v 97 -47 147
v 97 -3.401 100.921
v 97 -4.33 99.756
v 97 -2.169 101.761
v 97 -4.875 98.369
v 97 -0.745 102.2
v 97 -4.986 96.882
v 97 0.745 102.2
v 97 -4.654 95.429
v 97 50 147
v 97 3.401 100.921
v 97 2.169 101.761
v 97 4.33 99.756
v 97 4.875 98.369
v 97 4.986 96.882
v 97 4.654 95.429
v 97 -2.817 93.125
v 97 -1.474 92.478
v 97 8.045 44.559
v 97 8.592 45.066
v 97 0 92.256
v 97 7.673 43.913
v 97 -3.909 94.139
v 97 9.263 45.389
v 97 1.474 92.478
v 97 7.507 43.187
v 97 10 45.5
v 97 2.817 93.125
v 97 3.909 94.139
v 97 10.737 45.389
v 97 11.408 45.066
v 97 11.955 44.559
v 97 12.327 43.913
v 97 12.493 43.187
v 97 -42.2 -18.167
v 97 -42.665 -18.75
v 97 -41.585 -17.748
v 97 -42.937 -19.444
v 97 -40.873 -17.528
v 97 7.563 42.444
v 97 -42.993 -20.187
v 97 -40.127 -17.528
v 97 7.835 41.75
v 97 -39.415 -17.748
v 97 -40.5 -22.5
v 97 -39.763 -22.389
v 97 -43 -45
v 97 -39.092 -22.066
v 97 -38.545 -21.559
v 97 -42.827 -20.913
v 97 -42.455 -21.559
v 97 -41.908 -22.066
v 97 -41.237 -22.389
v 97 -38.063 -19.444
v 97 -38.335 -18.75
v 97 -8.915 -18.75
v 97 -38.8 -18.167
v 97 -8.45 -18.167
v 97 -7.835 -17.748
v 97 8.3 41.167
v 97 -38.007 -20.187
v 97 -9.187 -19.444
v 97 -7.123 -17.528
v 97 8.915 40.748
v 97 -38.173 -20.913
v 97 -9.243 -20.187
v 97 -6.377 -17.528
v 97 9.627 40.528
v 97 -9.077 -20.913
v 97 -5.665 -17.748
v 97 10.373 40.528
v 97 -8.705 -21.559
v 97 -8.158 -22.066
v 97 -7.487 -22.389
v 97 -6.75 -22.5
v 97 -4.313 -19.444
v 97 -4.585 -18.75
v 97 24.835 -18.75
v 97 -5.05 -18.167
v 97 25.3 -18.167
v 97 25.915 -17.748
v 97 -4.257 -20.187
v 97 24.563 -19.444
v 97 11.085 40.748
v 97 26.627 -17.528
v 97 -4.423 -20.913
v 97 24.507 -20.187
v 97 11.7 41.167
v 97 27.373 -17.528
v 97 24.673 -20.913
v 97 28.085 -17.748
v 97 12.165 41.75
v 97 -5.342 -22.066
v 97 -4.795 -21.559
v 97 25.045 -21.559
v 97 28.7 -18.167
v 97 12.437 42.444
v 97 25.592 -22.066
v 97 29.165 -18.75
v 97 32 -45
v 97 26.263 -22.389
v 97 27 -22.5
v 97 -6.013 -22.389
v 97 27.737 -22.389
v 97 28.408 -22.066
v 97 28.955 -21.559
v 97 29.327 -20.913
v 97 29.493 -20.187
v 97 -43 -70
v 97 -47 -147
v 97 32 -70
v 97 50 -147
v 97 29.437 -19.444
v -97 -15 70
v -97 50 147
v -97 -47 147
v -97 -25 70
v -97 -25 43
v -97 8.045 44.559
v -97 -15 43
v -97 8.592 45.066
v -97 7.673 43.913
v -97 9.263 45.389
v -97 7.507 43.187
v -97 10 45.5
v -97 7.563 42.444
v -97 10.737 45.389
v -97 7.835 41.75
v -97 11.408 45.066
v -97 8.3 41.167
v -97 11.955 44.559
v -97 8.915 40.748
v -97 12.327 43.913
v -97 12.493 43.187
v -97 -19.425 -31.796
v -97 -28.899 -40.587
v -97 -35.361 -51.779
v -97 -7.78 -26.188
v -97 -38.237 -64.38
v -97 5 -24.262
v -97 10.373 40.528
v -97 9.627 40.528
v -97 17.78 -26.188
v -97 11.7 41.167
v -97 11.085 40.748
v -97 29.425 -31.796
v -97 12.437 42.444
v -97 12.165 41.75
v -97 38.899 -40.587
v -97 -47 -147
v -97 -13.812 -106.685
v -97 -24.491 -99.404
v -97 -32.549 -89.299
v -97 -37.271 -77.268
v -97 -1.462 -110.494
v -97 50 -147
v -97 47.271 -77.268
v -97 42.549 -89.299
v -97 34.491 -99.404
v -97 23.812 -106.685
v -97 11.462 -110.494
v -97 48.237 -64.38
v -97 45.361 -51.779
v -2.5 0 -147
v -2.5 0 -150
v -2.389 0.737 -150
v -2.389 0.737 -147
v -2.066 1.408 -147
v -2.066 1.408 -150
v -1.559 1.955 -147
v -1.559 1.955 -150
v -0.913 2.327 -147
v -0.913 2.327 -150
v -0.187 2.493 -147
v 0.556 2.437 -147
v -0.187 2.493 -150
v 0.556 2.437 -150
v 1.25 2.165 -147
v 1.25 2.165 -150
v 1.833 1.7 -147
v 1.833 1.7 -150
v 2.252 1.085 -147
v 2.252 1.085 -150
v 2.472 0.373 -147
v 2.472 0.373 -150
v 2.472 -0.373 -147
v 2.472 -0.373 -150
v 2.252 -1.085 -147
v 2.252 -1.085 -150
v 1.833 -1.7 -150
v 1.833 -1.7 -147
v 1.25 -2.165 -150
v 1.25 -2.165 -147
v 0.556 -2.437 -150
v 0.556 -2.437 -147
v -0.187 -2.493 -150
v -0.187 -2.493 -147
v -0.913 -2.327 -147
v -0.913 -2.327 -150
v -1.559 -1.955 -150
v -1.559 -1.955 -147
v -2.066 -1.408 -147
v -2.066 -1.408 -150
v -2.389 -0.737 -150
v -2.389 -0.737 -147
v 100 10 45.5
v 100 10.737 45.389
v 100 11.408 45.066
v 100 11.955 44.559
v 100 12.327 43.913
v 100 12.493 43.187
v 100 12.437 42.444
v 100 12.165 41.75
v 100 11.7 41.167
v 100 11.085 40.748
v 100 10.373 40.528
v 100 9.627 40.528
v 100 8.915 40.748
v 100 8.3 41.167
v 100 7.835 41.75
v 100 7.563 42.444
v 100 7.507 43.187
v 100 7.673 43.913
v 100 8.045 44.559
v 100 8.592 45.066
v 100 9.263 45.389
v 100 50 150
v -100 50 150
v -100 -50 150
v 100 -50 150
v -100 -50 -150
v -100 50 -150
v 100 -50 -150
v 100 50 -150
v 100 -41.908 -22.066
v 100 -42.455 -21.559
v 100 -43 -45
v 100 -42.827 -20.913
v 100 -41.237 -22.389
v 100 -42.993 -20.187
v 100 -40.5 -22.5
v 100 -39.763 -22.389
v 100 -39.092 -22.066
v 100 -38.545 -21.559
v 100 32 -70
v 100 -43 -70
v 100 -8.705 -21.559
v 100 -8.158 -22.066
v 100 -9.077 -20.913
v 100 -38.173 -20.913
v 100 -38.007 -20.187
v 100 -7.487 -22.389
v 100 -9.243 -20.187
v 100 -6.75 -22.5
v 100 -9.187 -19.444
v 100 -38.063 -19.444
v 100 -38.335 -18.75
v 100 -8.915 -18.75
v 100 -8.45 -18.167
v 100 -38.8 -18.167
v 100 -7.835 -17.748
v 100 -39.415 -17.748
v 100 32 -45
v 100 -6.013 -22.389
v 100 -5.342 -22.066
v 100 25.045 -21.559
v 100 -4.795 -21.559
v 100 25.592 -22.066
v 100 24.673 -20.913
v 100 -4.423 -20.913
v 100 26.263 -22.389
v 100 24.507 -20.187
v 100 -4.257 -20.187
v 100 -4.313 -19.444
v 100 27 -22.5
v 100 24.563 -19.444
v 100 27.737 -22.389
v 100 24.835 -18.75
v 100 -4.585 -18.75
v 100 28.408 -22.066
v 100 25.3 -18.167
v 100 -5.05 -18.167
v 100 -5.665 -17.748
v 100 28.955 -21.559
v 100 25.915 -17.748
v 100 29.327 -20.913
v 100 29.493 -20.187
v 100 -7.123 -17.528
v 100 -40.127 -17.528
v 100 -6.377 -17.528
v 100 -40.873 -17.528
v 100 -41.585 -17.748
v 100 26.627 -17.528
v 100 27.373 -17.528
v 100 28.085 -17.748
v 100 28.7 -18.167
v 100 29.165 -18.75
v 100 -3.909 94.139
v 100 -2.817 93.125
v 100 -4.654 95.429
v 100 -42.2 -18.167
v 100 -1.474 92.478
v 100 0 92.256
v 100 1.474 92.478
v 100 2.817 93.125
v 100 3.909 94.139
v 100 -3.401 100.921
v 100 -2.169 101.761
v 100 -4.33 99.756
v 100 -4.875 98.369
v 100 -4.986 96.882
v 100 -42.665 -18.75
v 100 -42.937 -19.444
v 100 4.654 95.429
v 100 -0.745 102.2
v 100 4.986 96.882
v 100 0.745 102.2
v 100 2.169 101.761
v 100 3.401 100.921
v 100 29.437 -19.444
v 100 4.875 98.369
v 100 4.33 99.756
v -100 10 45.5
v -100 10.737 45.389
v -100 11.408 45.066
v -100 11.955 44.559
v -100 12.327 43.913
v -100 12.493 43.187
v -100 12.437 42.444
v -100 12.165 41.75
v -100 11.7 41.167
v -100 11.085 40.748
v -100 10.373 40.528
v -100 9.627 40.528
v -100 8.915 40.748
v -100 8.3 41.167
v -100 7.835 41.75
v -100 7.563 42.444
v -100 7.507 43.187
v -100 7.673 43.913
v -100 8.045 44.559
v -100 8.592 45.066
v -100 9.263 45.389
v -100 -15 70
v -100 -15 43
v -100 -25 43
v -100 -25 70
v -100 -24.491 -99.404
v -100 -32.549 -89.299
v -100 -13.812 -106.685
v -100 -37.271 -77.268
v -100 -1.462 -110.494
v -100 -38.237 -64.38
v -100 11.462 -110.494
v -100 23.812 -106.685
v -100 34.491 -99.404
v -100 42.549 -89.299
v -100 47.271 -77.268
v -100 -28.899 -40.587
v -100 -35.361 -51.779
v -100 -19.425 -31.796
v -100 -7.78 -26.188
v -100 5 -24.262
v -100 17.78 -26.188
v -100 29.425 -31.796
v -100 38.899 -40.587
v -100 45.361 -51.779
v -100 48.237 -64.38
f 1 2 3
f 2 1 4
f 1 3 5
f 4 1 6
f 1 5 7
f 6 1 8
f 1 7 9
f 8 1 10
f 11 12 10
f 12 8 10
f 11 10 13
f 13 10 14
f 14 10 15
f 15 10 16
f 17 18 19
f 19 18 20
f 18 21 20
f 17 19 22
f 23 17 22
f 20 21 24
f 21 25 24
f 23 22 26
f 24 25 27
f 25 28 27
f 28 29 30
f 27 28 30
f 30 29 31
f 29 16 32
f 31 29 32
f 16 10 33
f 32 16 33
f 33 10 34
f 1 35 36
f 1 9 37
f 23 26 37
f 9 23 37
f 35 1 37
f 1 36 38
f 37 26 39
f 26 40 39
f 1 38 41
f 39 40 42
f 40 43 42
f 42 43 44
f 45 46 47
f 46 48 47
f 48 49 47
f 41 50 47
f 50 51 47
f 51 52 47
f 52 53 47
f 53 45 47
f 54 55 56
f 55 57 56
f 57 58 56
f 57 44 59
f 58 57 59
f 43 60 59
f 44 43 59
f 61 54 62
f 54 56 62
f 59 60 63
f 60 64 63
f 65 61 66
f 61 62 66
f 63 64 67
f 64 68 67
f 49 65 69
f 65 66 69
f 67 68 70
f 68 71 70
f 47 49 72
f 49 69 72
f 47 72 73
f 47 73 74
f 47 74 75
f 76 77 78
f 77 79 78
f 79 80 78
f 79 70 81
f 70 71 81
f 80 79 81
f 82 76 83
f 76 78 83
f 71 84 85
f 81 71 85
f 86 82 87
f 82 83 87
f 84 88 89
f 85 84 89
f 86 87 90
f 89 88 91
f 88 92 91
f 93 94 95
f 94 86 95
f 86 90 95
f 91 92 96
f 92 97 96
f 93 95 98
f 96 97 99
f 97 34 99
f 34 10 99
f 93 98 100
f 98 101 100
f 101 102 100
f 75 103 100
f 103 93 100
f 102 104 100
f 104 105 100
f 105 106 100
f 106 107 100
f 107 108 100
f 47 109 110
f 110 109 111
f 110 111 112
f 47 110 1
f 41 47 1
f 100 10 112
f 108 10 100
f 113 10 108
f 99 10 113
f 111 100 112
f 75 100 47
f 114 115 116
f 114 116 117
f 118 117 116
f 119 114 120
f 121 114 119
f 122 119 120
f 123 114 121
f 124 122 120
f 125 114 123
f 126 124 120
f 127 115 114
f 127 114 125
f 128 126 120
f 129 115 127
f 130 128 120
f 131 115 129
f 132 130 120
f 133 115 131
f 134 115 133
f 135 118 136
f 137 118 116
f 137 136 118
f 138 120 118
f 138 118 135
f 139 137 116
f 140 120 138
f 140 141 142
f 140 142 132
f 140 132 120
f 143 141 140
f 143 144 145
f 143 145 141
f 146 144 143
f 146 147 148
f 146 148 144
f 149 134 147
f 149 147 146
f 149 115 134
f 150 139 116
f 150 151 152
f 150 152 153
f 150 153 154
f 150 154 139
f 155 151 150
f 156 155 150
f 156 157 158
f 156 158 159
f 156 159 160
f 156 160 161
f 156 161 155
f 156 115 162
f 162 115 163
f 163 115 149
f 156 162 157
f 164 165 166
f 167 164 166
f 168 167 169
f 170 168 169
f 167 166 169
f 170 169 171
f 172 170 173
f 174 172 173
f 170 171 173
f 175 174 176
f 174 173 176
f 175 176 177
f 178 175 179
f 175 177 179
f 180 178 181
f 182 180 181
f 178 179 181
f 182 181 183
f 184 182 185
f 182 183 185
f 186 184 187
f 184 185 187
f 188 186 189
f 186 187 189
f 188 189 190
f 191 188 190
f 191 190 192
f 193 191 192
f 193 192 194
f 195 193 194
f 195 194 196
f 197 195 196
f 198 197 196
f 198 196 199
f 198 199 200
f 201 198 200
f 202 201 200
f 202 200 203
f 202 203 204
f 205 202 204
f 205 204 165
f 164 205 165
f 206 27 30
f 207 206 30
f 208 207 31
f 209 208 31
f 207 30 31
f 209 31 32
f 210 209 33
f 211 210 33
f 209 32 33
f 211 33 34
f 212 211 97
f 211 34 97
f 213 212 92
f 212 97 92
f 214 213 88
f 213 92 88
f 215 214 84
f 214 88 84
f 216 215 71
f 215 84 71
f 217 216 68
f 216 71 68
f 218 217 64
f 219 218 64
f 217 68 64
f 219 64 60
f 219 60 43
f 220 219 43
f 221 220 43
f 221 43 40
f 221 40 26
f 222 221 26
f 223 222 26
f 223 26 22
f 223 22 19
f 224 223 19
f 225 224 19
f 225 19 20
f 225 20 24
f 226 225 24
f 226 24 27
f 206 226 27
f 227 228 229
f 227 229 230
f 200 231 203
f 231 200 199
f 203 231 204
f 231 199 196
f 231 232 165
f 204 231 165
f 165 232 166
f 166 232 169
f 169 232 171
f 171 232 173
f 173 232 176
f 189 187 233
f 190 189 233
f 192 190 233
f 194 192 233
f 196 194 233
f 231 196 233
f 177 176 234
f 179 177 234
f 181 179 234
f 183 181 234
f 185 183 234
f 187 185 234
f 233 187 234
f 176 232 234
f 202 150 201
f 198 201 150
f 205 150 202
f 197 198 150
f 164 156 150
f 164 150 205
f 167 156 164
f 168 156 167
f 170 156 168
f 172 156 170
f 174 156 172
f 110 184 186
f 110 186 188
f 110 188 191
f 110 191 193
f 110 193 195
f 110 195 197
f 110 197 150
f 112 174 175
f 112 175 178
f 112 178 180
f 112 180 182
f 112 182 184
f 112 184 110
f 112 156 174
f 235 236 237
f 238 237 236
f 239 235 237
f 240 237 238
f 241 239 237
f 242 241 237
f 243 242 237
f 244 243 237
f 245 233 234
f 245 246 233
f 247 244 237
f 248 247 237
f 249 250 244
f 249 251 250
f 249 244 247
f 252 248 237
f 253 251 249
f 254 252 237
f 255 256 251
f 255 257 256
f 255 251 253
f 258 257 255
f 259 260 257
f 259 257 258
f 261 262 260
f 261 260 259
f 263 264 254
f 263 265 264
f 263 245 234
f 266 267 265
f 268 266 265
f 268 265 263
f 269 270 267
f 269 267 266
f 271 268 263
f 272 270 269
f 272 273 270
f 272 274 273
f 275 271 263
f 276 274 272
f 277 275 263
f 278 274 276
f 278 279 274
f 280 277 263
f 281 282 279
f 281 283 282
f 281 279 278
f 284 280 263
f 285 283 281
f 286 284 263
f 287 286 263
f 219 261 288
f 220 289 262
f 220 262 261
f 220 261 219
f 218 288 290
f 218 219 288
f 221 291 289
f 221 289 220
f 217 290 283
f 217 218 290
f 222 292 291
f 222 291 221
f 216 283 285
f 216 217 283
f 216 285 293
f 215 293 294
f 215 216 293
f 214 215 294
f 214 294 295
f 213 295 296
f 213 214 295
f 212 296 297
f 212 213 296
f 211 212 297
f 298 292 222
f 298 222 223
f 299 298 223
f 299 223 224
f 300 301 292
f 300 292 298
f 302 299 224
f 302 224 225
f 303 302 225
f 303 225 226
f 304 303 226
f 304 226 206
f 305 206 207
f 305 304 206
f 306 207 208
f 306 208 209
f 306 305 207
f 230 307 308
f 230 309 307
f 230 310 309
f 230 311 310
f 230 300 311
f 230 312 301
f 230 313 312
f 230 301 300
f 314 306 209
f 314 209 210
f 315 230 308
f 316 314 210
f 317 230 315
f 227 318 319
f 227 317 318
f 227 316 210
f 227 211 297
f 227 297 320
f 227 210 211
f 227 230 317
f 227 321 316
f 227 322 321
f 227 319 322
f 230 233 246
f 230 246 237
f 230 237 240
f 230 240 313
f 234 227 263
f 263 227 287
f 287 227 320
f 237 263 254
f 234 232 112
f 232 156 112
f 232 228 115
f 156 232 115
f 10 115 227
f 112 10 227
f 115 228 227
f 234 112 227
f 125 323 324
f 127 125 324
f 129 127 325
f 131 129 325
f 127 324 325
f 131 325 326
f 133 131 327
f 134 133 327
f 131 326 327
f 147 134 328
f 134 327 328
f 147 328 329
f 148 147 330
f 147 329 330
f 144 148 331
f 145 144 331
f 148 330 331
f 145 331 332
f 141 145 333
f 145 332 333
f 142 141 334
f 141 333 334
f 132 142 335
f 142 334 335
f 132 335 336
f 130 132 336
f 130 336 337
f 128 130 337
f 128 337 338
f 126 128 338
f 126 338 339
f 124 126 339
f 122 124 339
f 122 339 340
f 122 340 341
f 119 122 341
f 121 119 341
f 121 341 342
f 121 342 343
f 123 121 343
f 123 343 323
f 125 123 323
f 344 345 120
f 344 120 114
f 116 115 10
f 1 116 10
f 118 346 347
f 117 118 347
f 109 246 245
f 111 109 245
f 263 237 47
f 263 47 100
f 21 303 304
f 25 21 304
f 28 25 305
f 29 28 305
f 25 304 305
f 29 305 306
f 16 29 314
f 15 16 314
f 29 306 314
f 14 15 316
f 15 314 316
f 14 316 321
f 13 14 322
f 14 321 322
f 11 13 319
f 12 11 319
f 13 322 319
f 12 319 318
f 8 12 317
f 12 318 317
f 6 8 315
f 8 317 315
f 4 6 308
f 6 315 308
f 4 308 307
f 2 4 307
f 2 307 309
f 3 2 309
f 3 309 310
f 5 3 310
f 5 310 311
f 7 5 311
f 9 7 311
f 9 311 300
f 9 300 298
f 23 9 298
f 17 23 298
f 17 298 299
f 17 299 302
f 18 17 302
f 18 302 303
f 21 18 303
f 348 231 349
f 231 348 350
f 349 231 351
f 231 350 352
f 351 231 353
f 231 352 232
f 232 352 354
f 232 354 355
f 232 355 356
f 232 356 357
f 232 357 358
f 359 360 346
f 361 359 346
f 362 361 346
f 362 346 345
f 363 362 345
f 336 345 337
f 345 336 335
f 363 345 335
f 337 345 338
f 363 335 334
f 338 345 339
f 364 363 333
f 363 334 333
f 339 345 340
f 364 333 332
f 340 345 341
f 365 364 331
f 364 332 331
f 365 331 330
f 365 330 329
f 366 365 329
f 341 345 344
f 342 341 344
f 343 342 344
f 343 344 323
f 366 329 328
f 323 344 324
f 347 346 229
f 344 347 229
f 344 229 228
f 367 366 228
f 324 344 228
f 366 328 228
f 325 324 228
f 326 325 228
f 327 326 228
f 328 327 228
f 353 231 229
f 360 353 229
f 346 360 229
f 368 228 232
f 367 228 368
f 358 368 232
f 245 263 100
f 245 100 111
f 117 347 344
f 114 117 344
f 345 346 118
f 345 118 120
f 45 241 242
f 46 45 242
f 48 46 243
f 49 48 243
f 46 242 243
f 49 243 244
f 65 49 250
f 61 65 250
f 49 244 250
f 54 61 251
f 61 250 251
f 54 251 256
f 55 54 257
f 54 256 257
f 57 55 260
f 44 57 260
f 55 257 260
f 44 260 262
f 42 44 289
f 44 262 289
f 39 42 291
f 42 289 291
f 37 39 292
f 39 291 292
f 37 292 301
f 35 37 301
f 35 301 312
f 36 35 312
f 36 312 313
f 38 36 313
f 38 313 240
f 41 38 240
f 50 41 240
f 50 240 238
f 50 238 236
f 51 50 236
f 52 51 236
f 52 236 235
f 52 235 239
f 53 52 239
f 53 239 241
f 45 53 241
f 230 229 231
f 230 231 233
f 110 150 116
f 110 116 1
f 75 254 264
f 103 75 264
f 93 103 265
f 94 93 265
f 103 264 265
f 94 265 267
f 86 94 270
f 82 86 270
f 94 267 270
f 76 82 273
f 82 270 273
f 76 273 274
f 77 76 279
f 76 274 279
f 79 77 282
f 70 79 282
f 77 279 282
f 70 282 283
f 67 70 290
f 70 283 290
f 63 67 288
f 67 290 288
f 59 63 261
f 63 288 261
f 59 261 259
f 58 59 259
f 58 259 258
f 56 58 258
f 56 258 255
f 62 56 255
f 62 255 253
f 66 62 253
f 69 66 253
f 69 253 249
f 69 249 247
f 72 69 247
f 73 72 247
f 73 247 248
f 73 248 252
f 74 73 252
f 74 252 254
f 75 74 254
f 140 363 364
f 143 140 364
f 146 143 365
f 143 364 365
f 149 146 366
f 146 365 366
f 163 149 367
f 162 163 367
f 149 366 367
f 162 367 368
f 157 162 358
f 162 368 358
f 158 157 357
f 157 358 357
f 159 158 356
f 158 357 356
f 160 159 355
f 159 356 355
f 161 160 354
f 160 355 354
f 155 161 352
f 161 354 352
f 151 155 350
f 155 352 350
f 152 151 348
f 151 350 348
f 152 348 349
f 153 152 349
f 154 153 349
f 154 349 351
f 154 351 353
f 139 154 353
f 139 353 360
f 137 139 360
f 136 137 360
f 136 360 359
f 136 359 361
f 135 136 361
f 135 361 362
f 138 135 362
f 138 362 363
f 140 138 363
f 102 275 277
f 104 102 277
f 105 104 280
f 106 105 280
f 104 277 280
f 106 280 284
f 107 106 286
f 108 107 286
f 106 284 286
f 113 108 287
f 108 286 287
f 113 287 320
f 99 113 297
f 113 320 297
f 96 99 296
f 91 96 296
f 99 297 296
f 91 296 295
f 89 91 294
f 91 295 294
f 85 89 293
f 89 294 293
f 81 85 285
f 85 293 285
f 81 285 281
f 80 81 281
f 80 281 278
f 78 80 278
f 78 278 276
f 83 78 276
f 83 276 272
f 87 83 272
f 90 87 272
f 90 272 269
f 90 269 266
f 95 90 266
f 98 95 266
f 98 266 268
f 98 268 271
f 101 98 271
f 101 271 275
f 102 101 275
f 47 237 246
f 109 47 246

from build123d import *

# Parameters (mm, degrees)
ESBO_O1_W                = 200
ESBO_O1_H                = 100
RESSALTO_EXTRUS_O1_DEPTH = 150
ESBO_O2_W                = 194
ESBO_O2_H                = 294
CORTE_EXTRUS_O1_DEPTH    = 97
ESBO_O5_R                = 5
CORTE_EXTRUS_O4_DEPTH    = 10
ESBO_O7_R                = 2.5
CORTE_EXTRUS_O6_DEPTH    = 10
ESBO_O8_W                = 27
ESBO_O8_H                = 10
CORTE_EXTRUS_O9_DEPTH    = 10
ESBO_O11_R               = 2.5
CORTE_EXTRUS_O12_DEPTH   = 201
ESBO_O12_R               = 2.5
ESBO_O12_W               = 25
ESBO_O12_H               = 75
CORTE_EXTRUS_O13_DEPTH   = 10
ESBO_O13_R               = 43.358301647
CORTE_EXTRUS_O14_DEPTH   = 10


with BuildPart() as part:
    # Esboço1 → Ressalto-extrusão1 (new body, symmetric)
    with BuildSketch(Plane.XY):
        Rectangle(ESBO_O1_W, ESBO_O1_H)
    extrude(amount=RESSALTO_EXTRUS_O1_DEPTH, both=True)

    # Esboço2 → Corte-extrusão1 (cut)
    with BuildSketch(Plane(origin=(0, 50, 0), x_dir=(1, 0, 0), z_dir=(0, 1, 0))):
        Rectangle(ESBO_O2_W, ESBO_O2_H)
    extrude(amount=-CORTE_EXTRUS_O1_DEPTH, mode=Mode.SUBTRACT)

    # Esboço5 → Corte-extrusão4 (cut)
    with BuildSketch(Plane(origin=(100, 0, 0), x_dir=(0, 0, -1), z_dir=(1, 0, 0))):
        with Locations((-97.256103524, 0)):
            Circle(ESBO_O5_R)
    extrude(amount=-CORTE_EXTRUS_O4_DEPTH, mode=Mode.SUBTRACT)

    # Esboço7 → Corte-extrusão6 (cut)
    with BuildSketch(Plane(origin=(0, 0, -150), x_dir=(-1, 0, 0), z_dir=(0, 0, -1))):
        Circle(ESBO_O7_R)
    extrude(amount=-CORTE_EXTRUS_O6_DEPTH, mode=Mode.SUBTRACT)

    # Esboço8 → Corte-extrusão9 (cut)
    with BuildSketch(Plane.ZY.offset(100)):
        with Locations((56.5, -20)):
            Rectangle(ESBO_O8_W, ESBO_O8_H)
    extrude(amount=-CORTE_EXTRUS_O9_DEPTH, mode=Mode.SUBTRACT)

    # Esboço11 → Corte-extrusão12 (cut, through all)
    with BuildSketch(Plane.ZY.offset(100)):
        with Locations((43, 10)):
            Circle(ESBO_O11_R)
    extrude(amount=-CORTE_EXTRUS_O12_DEPTH, mode=Mode.SUBTRACT)

    # Esboço12 → Corte-extrusão13 (cut)
    with BuildSketch(Plane(origin=(100, 0, 0), x_dir=(0, 0, -1), z_dir=(1, 0, 0))):
        with Locations((20, 27)):
            Circle(ESBO_O12_R)
        with Locations((20, -6.75)):
            Circle(ESBO_O12_R)
        with Locations((20, -40.5)):
            Circle(ESBO_O12_R)
        with Locations((57.5, -5.5)):
            Rectangle(ESBO_O12_W, ESBO_O12_H)
    extrude(amount=-CORTE_EXTRUS_O13_DEPTH, mode=Mode.SUBTRACT)

    # Esboço13 → Corte-extrusão14 (cut)
    with BuildSketch(Plane.ZY.offset(100)):
        with Locations((-67.620059567, 5)):
            Circle(ESBO_O13_R)
    extrude(amount=-CORTE_EXTRUS_O14_DEPTH, mode=Mode.SUBTRACT)


solid = part.part
